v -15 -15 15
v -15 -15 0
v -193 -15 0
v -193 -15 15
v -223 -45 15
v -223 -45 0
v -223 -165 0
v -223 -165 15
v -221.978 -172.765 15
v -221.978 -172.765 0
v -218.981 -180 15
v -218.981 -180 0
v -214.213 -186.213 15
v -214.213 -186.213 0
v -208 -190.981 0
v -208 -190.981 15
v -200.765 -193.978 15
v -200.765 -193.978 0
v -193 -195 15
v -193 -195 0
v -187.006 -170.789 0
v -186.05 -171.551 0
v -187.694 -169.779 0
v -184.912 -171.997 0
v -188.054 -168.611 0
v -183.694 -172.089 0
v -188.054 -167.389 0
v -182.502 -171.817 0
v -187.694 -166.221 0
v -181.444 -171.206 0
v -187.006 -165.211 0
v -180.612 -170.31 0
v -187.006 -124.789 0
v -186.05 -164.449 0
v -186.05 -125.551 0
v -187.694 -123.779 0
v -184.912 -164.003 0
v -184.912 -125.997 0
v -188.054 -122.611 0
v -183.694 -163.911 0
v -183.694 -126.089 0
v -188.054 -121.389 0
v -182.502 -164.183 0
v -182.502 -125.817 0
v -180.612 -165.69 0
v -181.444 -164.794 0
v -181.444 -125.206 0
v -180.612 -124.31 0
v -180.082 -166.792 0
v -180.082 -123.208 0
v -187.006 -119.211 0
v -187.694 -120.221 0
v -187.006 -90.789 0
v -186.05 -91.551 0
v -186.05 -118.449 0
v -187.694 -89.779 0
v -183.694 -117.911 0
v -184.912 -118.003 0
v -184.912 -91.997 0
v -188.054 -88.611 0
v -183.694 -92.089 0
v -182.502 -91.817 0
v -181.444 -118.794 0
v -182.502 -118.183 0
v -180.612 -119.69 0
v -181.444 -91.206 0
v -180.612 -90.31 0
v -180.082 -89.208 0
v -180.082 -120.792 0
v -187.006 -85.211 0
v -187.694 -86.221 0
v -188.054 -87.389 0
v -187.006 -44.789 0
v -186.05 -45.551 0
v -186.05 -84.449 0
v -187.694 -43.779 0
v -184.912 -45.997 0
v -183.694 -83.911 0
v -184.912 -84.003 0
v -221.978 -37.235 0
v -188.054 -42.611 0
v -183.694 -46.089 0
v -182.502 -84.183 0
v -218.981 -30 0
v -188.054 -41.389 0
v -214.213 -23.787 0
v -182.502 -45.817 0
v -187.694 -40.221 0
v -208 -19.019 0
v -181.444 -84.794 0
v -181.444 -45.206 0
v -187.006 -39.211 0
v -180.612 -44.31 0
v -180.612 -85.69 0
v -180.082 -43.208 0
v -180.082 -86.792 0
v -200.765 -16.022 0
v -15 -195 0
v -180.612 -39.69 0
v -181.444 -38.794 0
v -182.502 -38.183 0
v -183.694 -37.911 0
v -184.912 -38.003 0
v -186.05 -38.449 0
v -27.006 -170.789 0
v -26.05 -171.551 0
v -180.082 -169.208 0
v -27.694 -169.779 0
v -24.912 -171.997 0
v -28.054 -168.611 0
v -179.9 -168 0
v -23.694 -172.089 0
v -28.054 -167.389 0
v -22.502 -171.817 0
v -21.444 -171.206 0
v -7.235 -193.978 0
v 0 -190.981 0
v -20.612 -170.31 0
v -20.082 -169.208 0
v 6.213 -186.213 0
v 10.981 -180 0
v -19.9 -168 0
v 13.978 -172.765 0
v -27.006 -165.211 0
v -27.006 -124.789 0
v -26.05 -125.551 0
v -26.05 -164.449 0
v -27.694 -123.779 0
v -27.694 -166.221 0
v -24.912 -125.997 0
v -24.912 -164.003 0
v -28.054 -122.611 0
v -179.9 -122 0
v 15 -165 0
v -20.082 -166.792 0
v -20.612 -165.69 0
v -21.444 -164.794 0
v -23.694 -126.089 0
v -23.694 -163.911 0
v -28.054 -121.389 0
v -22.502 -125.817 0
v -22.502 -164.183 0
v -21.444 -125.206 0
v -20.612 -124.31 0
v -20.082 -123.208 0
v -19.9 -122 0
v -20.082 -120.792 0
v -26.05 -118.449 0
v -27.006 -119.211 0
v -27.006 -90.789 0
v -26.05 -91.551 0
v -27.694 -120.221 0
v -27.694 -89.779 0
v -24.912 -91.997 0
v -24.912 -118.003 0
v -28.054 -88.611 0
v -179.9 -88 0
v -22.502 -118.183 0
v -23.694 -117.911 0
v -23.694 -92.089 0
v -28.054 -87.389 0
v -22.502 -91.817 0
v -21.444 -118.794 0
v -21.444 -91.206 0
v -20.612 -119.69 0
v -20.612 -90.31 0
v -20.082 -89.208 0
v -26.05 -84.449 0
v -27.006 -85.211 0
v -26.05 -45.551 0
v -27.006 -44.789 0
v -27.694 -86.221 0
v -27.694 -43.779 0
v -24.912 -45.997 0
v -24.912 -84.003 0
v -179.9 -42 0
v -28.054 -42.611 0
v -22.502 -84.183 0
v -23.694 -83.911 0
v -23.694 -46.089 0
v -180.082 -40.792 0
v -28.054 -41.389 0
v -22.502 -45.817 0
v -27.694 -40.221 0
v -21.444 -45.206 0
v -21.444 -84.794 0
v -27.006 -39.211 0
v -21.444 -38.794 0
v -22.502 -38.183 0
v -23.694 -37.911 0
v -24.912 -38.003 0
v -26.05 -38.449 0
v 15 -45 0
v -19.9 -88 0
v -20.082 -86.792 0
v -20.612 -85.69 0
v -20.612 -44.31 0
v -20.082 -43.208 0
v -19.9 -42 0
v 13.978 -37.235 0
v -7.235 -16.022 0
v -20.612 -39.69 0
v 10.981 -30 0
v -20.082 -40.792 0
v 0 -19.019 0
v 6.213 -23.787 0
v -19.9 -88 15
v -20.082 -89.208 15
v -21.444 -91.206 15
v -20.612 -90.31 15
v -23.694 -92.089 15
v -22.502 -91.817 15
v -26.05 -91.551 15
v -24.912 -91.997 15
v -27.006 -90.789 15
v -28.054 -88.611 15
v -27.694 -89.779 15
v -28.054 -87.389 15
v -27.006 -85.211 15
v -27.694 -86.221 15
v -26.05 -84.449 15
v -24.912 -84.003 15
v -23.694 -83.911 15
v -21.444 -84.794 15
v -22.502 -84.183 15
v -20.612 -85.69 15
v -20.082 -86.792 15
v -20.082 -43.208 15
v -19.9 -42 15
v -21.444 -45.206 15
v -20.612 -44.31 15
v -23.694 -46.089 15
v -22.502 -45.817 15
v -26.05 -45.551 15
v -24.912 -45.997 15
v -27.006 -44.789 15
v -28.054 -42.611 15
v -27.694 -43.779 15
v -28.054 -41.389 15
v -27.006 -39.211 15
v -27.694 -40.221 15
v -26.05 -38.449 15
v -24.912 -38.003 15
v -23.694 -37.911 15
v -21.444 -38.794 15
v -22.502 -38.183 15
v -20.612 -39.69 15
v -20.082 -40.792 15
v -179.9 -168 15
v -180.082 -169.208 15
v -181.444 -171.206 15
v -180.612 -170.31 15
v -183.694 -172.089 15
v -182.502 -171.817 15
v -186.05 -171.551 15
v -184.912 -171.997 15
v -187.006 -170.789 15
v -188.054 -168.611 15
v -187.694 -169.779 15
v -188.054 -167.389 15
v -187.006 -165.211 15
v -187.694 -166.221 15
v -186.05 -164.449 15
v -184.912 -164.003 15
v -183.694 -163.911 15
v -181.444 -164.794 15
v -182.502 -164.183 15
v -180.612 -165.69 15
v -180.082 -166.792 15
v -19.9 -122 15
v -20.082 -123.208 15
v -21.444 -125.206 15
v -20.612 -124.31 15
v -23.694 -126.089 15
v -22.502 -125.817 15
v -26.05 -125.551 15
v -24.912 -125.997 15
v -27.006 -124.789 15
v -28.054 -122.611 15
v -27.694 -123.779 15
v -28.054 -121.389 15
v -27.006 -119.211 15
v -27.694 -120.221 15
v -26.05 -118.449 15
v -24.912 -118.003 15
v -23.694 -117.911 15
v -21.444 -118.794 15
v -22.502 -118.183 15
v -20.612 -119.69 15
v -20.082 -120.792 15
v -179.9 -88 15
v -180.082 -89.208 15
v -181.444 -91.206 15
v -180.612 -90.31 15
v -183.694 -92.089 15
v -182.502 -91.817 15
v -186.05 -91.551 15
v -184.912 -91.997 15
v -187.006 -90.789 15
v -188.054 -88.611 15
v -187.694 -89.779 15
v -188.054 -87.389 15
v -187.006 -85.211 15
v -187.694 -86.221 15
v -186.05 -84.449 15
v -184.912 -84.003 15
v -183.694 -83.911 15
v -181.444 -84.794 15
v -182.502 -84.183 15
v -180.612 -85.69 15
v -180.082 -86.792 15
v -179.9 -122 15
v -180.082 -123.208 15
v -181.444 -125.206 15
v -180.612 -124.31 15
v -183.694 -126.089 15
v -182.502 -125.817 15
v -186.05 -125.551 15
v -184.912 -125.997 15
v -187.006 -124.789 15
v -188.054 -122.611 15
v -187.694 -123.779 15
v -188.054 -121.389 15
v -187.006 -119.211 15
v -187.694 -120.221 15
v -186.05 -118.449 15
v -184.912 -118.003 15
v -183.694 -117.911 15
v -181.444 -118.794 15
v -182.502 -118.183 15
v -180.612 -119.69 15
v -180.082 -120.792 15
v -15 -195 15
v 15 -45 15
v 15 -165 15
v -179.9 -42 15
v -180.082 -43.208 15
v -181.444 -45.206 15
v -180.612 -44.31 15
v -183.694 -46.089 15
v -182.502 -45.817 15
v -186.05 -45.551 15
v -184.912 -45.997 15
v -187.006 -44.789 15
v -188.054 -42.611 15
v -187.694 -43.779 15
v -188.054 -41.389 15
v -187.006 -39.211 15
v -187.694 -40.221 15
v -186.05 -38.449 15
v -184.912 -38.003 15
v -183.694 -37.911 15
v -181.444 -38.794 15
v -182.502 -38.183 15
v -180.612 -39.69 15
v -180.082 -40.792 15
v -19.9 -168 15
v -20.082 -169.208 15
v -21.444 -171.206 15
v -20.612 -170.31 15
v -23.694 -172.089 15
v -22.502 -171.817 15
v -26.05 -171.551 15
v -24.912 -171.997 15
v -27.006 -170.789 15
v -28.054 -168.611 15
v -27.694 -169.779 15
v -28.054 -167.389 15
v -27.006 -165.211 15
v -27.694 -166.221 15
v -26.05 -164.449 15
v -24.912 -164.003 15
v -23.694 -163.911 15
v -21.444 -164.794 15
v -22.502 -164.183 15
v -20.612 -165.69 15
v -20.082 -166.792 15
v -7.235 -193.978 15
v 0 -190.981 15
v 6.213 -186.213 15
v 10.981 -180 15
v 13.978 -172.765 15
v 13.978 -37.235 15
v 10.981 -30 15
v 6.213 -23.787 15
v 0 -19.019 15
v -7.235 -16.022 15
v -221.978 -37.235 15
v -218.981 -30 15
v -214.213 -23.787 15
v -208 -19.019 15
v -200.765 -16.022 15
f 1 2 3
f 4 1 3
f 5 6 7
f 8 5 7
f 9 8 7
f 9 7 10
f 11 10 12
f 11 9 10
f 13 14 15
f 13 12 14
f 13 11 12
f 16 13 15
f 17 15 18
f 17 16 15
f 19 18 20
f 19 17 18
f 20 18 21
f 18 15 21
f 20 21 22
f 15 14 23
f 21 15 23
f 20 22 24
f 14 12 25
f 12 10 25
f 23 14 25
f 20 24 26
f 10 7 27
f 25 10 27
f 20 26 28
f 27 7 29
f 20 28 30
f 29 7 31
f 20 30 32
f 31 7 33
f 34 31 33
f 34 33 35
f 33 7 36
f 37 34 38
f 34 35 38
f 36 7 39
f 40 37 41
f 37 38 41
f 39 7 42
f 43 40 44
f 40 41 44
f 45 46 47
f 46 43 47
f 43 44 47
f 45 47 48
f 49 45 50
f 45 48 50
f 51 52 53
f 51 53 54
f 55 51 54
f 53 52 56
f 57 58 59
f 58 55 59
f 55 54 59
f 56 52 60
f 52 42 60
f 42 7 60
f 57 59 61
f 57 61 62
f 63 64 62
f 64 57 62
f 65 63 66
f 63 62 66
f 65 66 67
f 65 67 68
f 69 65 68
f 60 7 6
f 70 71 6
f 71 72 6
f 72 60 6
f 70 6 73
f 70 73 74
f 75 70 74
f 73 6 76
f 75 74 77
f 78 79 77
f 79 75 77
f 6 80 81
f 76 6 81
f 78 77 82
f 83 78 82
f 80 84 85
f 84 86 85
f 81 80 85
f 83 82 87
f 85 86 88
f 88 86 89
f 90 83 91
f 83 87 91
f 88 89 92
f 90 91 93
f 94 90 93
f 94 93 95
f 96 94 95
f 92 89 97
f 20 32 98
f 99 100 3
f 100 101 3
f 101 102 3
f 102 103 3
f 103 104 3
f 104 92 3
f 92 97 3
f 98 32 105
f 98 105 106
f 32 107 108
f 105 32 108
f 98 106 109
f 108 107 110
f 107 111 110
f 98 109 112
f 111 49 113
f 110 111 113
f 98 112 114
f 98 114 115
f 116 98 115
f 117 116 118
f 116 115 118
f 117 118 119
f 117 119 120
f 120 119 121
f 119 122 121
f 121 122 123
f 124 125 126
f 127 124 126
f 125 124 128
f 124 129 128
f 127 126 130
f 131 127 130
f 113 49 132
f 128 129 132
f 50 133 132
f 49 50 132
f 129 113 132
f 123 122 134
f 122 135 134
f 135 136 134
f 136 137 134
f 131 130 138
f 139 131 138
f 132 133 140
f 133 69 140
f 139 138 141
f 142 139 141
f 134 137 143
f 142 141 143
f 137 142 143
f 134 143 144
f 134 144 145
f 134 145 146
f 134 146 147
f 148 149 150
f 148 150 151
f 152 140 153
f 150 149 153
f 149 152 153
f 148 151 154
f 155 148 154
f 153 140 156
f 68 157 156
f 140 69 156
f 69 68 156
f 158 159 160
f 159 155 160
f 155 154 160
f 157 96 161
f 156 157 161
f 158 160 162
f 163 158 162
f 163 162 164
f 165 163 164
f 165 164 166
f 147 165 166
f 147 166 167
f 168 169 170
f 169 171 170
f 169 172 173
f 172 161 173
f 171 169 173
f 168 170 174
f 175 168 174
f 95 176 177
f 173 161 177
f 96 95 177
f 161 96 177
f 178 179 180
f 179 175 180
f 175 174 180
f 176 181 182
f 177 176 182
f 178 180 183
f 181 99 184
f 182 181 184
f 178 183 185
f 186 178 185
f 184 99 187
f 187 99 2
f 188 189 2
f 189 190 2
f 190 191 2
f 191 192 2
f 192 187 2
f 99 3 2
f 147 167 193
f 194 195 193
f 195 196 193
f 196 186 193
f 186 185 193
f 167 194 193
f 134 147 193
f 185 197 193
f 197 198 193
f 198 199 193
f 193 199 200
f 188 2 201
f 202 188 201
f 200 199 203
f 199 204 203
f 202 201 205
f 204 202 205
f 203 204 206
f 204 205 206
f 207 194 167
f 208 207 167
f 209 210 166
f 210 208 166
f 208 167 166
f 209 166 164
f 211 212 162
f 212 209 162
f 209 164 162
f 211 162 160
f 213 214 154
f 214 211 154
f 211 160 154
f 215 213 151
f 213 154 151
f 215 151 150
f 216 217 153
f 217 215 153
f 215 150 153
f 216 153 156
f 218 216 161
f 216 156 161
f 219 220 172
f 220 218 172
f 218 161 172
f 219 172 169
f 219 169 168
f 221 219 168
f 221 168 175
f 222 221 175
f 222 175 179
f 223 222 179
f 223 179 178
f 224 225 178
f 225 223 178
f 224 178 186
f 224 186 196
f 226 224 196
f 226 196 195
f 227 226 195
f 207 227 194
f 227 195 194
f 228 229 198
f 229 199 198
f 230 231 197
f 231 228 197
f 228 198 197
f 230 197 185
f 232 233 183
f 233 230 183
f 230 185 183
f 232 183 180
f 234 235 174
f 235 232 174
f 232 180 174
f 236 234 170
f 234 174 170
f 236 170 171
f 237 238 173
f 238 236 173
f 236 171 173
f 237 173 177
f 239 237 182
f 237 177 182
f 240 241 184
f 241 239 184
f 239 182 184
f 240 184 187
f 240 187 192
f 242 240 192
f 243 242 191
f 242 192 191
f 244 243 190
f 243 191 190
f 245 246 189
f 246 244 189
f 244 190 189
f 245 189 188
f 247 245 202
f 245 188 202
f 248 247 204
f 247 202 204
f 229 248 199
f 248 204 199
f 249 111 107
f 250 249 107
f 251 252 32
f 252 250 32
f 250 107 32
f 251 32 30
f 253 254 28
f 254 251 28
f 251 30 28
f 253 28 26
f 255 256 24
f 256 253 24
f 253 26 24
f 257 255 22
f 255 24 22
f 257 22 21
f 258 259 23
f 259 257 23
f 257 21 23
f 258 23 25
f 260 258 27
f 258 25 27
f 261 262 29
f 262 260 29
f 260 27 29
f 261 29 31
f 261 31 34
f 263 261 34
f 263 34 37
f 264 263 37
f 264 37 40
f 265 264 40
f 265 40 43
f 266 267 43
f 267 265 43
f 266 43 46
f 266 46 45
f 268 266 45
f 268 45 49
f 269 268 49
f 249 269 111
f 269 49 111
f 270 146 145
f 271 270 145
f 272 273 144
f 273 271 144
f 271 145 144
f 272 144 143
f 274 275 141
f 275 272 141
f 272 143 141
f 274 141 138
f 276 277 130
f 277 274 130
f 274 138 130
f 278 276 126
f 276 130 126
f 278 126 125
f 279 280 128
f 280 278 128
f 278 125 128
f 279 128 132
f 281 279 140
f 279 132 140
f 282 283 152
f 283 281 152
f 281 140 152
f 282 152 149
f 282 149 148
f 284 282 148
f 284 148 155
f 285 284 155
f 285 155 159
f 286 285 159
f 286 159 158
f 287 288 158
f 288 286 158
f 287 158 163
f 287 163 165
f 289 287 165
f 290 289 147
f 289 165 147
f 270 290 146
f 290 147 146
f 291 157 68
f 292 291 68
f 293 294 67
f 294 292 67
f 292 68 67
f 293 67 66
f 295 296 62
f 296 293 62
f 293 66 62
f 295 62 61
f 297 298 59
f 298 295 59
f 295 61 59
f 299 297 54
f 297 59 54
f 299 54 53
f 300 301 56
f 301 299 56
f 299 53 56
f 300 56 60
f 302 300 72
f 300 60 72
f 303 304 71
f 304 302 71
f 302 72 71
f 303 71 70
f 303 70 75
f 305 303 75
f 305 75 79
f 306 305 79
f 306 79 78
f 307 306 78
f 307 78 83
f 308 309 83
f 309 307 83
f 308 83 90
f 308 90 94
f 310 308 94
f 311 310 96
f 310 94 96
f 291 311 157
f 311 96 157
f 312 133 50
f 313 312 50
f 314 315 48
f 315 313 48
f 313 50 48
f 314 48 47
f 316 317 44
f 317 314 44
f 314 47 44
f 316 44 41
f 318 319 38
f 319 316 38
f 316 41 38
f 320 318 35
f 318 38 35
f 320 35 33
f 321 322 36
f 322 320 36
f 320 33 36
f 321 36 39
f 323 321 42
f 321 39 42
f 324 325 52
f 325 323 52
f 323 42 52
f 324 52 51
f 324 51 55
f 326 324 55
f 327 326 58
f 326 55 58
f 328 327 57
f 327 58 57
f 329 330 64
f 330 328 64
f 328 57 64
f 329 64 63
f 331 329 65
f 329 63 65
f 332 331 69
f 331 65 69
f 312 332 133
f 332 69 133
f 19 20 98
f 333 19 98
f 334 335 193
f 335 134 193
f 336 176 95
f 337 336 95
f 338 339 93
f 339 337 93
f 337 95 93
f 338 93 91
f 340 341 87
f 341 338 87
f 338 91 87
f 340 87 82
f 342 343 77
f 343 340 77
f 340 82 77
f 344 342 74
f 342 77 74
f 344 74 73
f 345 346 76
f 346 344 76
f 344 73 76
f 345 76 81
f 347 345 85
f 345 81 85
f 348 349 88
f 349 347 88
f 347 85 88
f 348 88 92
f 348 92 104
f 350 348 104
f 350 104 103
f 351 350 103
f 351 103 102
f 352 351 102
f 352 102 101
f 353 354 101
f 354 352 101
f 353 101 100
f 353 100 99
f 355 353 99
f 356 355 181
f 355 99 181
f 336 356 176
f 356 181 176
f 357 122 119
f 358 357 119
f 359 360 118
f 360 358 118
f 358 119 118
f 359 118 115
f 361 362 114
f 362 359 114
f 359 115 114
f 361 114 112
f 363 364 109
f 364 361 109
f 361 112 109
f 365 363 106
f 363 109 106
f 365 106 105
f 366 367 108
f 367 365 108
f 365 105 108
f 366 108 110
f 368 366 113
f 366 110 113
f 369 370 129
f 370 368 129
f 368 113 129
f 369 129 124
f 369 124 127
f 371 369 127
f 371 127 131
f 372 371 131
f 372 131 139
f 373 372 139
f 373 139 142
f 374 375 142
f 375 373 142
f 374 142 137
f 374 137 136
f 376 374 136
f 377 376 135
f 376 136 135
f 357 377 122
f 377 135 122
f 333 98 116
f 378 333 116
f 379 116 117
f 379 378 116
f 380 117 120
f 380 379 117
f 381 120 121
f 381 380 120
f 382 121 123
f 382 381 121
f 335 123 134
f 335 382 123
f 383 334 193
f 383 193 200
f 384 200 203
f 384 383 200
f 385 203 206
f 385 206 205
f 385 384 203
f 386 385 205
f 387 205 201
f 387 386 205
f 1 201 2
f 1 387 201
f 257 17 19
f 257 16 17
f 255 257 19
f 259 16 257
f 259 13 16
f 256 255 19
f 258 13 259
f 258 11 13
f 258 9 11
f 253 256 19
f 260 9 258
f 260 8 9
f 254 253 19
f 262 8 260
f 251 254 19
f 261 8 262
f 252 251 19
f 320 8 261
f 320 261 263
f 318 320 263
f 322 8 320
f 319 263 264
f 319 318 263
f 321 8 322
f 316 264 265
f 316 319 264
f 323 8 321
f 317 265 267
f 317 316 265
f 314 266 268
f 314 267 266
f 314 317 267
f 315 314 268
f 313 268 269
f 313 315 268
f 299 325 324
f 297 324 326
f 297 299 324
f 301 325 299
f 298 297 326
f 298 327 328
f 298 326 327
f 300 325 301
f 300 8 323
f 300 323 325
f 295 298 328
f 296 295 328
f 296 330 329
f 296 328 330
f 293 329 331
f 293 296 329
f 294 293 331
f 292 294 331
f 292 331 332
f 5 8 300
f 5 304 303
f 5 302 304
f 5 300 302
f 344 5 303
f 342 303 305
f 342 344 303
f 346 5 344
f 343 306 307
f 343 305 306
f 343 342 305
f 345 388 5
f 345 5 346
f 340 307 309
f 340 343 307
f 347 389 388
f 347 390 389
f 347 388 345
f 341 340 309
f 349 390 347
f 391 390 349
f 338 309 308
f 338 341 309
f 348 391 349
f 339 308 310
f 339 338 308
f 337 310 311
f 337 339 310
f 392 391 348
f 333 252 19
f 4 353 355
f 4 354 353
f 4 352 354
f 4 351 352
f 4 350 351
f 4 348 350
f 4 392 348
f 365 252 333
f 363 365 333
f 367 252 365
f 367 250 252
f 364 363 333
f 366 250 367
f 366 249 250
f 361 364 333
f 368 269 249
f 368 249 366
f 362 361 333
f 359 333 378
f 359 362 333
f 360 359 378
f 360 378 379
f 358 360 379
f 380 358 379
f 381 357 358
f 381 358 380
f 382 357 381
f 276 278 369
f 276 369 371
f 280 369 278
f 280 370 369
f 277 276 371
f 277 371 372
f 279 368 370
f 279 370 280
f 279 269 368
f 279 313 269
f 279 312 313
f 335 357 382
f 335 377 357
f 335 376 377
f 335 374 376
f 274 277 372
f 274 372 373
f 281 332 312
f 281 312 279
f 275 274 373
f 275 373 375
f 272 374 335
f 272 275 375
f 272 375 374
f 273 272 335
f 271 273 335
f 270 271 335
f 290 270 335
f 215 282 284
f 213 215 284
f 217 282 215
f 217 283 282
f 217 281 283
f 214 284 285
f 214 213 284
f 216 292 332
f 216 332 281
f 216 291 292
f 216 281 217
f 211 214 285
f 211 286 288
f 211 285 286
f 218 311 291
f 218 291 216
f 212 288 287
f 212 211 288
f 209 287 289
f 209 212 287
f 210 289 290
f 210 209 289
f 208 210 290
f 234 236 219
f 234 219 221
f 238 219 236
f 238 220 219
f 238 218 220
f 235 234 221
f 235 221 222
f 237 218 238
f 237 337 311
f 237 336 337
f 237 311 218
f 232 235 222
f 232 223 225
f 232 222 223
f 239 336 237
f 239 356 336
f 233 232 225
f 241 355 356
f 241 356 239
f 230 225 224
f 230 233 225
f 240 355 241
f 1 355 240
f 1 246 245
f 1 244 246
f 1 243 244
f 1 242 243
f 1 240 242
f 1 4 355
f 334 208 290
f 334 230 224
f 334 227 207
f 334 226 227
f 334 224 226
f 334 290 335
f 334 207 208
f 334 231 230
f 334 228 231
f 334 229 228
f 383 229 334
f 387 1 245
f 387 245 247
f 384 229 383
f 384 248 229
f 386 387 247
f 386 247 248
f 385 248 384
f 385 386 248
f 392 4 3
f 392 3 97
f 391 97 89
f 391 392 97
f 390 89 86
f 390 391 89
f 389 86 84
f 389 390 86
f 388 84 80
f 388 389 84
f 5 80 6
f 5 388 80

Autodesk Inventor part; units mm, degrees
ref_plane "YZ Plane" through (0, 0, 0) normal (1, 0, 0) x (0, 1, 0)
ref_plane "XZ Plane" through (0, 0, 0) normal (0, 1, 0) x (-1, 0, 0)
ref_plane "XY Plane" through (0, 0, 0) normal (0, 0, 1) x (1, 0, 0)
sketch "Sketch1" plane through (0, 0, 0) normal (0, 0, 1) x (1, 0, 0)
  line L0 (0, -180) -> (0, -156) projected
  line L1 (0, -180) -> (-50.3388, -180) projected
  line L2 (-208, -30) -> (-157.6612, -30) projected
  line L3 (-208, -30) -> (-208, -54) projected
  line L4 (-208, -180) -> (-208, -156) projected
  line L5 (-157.6612, -180) -> (-208, -180) projected
  line L6 (15, -15) -> (-223, -15)
  line L7 (-223, -15) -> (-223, -195)
  line L8 (-223, -195) -> (15, -195)
  line L9 (15, -195) -> (15, -15)
  circle A0 centre (-24, -42) radius 4.1 projected
  circle A1 centre (-24, -88) radius 4.1 projected
  circle A2 centre (-24, -122) radius 4.1 projected
  circle A3 centre (-24, -168) radius 4.1 projected
  circle A4 centre (-184, -168) radius 4.1 projected
  circle A5 centre (-184, -122) radius 4.1 projected
  circle A6 centre (-184, -88) radius 4.1 projected
  circle A7 centre (-184, -42) radius 4.1 projected
  line L10 (0, -30) -> (0, -54) projected
  line L11 (-50.3388, -30) -> (0, -30) projected
  dimension "d0" = 15
  dimension "d2" = 15
  dimension "d3" = 15
extrude "Extrusion1" add sketch "Sketch1" along normal blind 15
fillet "Fillet1" radius 30 4 edges at (15, -15, 7.5) (-223, -15, 7.5) (-223, -195, 7.5) (15, -195, 7.5)
sketch "Sketch2" plane through (0, 0, 15) normal (0, 0, 1) x (1, 0, 0)
  line L0 (-223, -45) -> (-223, -165) construction
  line L1 (-223, -105) -> (15, -105) construction
  line L2 (15, -165) -> (15, -45) construction
  line L3 (-193, -195) -> (-15, -195) construction
  line L4 (-104, -195) -> (-104, -15) construction
  line L5 (-15, -15) -> (-193, -15) construction
  point P0 (0, 0)
properties part number "front_plate_Z"
